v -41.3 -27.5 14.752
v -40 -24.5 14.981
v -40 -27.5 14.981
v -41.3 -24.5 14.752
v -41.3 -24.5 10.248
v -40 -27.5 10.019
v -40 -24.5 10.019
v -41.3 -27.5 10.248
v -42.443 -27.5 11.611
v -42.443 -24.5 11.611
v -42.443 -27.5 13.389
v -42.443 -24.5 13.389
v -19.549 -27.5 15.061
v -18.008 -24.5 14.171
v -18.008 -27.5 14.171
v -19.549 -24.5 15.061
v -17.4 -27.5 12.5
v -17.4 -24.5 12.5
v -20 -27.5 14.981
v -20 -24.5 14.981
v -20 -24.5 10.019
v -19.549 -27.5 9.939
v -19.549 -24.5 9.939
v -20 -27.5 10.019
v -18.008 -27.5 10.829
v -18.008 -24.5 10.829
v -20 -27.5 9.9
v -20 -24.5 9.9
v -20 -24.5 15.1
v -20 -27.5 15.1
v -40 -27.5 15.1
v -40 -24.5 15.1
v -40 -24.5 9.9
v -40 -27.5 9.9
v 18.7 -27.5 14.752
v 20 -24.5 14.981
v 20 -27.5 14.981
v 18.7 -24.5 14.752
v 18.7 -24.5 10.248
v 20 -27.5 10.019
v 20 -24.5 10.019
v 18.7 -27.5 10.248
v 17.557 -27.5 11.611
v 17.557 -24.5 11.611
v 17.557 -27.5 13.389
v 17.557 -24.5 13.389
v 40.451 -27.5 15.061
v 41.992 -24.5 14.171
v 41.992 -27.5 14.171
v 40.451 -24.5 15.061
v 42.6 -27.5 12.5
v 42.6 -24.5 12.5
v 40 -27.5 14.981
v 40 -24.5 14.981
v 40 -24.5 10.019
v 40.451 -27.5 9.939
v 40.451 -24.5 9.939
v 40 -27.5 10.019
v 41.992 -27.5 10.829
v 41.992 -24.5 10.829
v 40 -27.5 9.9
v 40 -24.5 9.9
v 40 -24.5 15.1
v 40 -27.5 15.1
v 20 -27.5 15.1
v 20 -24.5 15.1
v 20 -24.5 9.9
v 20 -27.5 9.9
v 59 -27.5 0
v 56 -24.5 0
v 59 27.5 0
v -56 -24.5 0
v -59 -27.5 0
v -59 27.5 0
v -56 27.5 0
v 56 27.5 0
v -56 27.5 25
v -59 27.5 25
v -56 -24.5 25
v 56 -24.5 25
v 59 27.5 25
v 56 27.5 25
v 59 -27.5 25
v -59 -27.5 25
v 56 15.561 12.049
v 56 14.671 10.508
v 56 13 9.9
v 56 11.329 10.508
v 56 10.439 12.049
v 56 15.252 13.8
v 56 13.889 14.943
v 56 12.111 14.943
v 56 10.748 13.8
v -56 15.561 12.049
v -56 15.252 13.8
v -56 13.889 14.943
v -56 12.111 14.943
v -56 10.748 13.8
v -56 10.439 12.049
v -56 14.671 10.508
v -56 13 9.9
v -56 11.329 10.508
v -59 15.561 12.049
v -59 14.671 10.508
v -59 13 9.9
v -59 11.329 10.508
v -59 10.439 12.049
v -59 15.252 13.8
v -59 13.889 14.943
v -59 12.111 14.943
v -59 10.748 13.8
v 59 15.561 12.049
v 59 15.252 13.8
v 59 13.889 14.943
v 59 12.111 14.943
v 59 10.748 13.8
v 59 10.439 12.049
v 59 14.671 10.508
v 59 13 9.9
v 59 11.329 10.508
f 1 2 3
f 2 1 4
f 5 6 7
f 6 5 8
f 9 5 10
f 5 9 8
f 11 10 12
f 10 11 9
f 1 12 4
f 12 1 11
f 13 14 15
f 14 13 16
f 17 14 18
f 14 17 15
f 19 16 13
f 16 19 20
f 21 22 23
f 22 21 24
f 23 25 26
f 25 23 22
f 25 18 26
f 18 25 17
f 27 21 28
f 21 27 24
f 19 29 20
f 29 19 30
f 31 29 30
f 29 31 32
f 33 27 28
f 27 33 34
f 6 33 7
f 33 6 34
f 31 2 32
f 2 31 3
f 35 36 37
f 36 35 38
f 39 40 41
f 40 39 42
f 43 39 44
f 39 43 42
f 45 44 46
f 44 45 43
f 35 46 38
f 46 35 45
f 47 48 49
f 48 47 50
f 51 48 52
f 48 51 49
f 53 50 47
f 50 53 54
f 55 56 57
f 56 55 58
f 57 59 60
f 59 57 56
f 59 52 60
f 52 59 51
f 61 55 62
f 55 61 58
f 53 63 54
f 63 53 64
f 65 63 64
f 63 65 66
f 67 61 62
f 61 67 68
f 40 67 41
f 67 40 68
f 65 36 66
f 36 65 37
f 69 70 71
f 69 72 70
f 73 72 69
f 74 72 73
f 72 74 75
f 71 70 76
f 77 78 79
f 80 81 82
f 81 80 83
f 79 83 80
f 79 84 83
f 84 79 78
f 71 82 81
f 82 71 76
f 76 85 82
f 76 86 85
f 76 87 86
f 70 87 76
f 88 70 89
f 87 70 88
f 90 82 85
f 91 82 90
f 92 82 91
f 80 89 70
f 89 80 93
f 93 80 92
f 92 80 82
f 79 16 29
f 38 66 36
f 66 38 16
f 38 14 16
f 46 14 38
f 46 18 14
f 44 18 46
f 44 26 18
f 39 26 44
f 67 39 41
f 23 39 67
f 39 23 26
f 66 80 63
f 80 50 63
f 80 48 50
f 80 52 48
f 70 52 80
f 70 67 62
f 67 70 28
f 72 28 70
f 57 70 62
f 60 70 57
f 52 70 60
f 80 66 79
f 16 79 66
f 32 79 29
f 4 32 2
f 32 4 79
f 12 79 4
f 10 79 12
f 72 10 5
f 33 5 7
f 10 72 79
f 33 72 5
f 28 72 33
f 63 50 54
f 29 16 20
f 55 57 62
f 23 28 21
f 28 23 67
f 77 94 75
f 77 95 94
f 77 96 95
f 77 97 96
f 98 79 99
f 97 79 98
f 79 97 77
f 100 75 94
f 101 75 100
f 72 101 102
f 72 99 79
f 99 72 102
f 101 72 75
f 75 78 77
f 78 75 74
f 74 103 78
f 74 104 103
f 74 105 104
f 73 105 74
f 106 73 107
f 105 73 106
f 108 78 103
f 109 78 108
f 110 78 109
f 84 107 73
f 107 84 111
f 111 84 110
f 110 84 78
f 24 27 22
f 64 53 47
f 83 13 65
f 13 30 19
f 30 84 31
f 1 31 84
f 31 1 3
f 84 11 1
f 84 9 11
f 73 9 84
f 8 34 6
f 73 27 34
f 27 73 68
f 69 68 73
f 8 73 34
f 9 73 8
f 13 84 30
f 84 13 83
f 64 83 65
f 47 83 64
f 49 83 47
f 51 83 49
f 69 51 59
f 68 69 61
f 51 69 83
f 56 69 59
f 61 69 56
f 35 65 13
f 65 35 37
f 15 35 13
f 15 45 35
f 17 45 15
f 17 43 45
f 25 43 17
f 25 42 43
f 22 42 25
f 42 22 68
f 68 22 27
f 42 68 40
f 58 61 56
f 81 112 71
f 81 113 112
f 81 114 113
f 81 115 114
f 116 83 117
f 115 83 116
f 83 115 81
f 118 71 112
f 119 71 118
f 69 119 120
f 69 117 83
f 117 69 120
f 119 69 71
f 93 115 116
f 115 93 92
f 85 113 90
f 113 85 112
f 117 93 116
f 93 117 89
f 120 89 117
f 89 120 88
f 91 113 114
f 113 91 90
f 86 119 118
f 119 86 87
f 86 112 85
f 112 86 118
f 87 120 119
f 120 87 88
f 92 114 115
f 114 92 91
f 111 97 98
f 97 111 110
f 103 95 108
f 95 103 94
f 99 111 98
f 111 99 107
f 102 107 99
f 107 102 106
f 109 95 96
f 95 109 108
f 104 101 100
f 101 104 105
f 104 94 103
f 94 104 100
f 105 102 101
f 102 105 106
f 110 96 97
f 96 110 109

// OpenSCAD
holer=2.6;
difference(){
    linear_extrude(25)
    difference() {
        square([118,55],true);
        translate([0, 1.5, 0]) {
            square([112,52],true);    
        }
    }
    translate([55,13,12.5])
        hole();

    translate([-60,13,12.5])
        hole();


    translate([-30,0,0])
        roundbar();
    translate([30,0,0])
        roundbar();

}

module roundbar() {
     union(){
            translate([-10,-22,12.5])
        rotate([90,0,0])
            cylinder(7,r=holer);
        translate([10,-22,12.5])
        rotate([90,0,0])
            cylinder(7,r=holer);

        translate([0,-26,12.5])
        cube([20,7,holer*2],true);
    }
}

module hole() {
    rotate([0,90,0])
        cylinder(7,r=holer);
}
